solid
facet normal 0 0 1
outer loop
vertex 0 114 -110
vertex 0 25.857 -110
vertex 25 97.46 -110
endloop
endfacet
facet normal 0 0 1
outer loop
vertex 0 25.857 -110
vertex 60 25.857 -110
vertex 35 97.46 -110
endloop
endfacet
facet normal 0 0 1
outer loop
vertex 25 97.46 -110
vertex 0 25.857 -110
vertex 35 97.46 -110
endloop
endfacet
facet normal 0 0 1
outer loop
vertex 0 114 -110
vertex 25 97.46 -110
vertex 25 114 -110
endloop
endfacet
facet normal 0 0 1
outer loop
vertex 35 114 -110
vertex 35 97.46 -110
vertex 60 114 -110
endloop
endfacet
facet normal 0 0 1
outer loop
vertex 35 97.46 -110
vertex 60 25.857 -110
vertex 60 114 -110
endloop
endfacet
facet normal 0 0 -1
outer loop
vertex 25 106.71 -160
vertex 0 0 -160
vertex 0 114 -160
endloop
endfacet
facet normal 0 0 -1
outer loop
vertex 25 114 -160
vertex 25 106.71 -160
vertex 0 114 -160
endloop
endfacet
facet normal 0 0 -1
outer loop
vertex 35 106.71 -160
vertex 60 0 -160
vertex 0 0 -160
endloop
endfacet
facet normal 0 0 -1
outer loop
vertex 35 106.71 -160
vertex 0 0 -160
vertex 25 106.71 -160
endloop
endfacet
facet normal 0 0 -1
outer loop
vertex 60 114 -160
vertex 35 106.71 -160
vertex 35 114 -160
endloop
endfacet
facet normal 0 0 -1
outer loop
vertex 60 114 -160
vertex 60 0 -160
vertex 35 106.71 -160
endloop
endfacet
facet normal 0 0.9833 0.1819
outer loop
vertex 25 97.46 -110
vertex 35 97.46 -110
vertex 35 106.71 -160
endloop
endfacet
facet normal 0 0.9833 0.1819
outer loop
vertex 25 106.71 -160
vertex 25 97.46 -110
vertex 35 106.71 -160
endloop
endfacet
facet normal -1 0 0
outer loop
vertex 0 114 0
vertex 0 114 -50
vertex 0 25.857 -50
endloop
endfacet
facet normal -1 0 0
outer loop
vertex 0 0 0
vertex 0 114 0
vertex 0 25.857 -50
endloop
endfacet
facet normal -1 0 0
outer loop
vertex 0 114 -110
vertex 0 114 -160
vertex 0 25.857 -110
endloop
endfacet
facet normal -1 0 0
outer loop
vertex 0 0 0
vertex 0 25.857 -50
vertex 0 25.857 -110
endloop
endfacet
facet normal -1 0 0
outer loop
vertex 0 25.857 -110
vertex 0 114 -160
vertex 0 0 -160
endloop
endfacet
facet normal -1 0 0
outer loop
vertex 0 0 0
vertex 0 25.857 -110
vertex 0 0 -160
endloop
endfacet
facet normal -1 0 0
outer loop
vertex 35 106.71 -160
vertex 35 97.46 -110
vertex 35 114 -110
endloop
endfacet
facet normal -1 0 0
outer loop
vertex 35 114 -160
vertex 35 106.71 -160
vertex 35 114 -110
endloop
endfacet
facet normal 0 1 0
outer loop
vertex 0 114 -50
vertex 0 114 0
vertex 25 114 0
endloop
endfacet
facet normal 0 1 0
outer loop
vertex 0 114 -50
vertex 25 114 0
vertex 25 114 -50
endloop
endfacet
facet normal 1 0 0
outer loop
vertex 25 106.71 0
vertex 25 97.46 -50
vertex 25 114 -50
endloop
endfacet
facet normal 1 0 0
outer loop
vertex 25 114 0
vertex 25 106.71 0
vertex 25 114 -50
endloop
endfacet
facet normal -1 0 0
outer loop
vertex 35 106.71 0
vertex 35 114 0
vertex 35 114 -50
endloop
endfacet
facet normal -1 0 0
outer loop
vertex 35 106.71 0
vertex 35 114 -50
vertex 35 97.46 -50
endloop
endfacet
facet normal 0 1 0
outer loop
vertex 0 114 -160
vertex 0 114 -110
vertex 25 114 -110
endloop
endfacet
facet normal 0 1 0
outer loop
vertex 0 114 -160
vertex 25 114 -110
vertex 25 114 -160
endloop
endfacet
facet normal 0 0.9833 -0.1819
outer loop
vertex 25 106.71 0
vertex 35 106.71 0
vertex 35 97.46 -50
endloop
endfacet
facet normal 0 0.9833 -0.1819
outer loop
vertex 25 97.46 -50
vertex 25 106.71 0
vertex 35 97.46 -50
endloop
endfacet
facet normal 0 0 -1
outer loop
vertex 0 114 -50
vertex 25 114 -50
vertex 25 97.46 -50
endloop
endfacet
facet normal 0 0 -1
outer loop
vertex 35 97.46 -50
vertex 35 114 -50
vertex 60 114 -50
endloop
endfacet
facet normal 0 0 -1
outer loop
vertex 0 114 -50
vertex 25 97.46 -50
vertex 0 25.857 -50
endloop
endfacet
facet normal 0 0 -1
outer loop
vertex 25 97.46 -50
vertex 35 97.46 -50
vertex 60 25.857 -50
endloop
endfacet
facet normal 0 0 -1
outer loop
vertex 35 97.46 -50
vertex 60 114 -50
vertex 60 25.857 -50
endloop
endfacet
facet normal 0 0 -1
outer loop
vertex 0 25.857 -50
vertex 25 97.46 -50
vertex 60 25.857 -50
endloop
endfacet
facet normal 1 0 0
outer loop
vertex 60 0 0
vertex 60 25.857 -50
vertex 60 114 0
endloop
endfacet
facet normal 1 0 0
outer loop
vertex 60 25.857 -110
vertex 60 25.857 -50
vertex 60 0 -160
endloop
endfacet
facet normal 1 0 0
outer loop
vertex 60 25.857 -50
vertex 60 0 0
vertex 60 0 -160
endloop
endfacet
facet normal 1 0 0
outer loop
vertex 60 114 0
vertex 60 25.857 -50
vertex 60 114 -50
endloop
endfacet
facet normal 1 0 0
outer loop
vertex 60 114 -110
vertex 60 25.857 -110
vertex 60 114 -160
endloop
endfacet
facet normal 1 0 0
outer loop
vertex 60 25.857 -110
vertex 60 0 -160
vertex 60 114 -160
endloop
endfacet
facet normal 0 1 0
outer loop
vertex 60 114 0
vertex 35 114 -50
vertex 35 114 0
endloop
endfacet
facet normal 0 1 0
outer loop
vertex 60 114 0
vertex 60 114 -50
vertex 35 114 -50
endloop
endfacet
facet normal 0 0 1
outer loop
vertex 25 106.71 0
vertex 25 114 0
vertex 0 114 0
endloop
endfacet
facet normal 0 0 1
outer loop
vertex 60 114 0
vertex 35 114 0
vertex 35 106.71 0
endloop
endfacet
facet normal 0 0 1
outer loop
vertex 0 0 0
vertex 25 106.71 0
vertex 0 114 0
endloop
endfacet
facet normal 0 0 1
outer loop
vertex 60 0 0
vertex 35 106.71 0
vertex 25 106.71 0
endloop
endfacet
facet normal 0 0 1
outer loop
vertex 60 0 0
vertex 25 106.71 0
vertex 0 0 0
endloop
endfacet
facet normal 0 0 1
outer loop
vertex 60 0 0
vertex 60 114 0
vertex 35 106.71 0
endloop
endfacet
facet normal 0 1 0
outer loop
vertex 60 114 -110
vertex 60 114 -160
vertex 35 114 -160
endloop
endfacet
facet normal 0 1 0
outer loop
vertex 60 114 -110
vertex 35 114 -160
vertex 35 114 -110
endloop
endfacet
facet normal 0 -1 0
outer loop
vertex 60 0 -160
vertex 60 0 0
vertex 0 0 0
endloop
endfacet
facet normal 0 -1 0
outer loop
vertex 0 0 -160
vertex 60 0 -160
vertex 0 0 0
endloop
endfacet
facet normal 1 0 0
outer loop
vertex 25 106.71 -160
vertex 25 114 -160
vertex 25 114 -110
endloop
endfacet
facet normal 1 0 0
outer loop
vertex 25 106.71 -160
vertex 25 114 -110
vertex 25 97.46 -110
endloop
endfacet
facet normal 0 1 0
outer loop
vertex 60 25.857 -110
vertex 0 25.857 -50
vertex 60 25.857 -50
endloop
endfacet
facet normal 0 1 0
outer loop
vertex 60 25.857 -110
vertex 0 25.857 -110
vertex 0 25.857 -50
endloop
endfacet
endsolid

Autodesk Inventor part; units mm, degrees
ref_plane "YZ Plane" through (0, 0, 0) normal (1, 0, 0) x (0, 1, 0)
ref_plane "XZ Plane" through (0, 0, 0) normal (0, 1, 0) x (-1, 0, 0)
ref_plane "XY Plane" through (0, 0, 0) normal (0, 0, 1) x (1, 0, 0)
sketch "Sketch1" plane through (0, 0, 0) normal (1, 0, 0) x (0, 1, 0)
  line L0 (0, 0) -> (114, 0)
  line L1 (114, 0) -> (114, -50)
  line L2 (0, -50) -> (114, -50)
  line L3 (0, -50) -> (0, 0)
extrude "Extrusion1" add sketch "Sketch1" along normal blind 25
sketch "Sketch2" plane through (25, 0, 0) normal (1, 0, 0) x (0, 0, -1)
  line L0 (50, 114) -> (0, 114) projected
  line L1 (0, 114) -> (0, 79)
  line L2 (0, 114) -> (0, 0) projected
  line L3 (50, 0) -> (50, 114) projected
  line L4 (0, 79) -> (0, 106.71)
  line L5 (50, 79) -> (50, 97.46)
  line L6 (50, 97.46) -> (0, 106.71)
  line L7 (0, 0) -> (50, 0) projected
  line L8 (0, 106.71) -> (0, 0)
  line L9 (0, 0) -> (50, 0)
  line L10 (50, 0) -> (50, 97.46)
extrude "Extrusion2" add sketch "Sketch2" along normal blind 5 contours L3 L7 L2 L1 L6
mirror "Mirror1" about plane through (30, 51.2546, -24.2418) normal (1, 0, 0) of "Extrusion2", "Extrusion1"
sketch "Sketch3" plane through (0, 0, -50) normal (0, 0, -1) x (-1, 0, 0)
  line L0 (-60, 114) -> (-60, 0) projected
  line L1 (0, 0) -> (-60, 0) projected
  line L2 (-60, 0) -> (0, 0)
  line L3 (0, 0) -> (0, 25.8573)
  line L4 (0, 0) -> (0, 114) projected
  line L5 (-60, 25.8573) -> (0, 25.8573)
  line L6 (-60, 25.8573) -> (-60, 0)
extrude "Extrusion3" add sketch "Sketch3" along normal blind 30
mirror "Mirror2" about plane through (30, 12.9287, -80) normal (0, 0, -1) of "Extrusion2", "Extrusion1", "Mirror1", "Extrusion3"
properties part number "support"
